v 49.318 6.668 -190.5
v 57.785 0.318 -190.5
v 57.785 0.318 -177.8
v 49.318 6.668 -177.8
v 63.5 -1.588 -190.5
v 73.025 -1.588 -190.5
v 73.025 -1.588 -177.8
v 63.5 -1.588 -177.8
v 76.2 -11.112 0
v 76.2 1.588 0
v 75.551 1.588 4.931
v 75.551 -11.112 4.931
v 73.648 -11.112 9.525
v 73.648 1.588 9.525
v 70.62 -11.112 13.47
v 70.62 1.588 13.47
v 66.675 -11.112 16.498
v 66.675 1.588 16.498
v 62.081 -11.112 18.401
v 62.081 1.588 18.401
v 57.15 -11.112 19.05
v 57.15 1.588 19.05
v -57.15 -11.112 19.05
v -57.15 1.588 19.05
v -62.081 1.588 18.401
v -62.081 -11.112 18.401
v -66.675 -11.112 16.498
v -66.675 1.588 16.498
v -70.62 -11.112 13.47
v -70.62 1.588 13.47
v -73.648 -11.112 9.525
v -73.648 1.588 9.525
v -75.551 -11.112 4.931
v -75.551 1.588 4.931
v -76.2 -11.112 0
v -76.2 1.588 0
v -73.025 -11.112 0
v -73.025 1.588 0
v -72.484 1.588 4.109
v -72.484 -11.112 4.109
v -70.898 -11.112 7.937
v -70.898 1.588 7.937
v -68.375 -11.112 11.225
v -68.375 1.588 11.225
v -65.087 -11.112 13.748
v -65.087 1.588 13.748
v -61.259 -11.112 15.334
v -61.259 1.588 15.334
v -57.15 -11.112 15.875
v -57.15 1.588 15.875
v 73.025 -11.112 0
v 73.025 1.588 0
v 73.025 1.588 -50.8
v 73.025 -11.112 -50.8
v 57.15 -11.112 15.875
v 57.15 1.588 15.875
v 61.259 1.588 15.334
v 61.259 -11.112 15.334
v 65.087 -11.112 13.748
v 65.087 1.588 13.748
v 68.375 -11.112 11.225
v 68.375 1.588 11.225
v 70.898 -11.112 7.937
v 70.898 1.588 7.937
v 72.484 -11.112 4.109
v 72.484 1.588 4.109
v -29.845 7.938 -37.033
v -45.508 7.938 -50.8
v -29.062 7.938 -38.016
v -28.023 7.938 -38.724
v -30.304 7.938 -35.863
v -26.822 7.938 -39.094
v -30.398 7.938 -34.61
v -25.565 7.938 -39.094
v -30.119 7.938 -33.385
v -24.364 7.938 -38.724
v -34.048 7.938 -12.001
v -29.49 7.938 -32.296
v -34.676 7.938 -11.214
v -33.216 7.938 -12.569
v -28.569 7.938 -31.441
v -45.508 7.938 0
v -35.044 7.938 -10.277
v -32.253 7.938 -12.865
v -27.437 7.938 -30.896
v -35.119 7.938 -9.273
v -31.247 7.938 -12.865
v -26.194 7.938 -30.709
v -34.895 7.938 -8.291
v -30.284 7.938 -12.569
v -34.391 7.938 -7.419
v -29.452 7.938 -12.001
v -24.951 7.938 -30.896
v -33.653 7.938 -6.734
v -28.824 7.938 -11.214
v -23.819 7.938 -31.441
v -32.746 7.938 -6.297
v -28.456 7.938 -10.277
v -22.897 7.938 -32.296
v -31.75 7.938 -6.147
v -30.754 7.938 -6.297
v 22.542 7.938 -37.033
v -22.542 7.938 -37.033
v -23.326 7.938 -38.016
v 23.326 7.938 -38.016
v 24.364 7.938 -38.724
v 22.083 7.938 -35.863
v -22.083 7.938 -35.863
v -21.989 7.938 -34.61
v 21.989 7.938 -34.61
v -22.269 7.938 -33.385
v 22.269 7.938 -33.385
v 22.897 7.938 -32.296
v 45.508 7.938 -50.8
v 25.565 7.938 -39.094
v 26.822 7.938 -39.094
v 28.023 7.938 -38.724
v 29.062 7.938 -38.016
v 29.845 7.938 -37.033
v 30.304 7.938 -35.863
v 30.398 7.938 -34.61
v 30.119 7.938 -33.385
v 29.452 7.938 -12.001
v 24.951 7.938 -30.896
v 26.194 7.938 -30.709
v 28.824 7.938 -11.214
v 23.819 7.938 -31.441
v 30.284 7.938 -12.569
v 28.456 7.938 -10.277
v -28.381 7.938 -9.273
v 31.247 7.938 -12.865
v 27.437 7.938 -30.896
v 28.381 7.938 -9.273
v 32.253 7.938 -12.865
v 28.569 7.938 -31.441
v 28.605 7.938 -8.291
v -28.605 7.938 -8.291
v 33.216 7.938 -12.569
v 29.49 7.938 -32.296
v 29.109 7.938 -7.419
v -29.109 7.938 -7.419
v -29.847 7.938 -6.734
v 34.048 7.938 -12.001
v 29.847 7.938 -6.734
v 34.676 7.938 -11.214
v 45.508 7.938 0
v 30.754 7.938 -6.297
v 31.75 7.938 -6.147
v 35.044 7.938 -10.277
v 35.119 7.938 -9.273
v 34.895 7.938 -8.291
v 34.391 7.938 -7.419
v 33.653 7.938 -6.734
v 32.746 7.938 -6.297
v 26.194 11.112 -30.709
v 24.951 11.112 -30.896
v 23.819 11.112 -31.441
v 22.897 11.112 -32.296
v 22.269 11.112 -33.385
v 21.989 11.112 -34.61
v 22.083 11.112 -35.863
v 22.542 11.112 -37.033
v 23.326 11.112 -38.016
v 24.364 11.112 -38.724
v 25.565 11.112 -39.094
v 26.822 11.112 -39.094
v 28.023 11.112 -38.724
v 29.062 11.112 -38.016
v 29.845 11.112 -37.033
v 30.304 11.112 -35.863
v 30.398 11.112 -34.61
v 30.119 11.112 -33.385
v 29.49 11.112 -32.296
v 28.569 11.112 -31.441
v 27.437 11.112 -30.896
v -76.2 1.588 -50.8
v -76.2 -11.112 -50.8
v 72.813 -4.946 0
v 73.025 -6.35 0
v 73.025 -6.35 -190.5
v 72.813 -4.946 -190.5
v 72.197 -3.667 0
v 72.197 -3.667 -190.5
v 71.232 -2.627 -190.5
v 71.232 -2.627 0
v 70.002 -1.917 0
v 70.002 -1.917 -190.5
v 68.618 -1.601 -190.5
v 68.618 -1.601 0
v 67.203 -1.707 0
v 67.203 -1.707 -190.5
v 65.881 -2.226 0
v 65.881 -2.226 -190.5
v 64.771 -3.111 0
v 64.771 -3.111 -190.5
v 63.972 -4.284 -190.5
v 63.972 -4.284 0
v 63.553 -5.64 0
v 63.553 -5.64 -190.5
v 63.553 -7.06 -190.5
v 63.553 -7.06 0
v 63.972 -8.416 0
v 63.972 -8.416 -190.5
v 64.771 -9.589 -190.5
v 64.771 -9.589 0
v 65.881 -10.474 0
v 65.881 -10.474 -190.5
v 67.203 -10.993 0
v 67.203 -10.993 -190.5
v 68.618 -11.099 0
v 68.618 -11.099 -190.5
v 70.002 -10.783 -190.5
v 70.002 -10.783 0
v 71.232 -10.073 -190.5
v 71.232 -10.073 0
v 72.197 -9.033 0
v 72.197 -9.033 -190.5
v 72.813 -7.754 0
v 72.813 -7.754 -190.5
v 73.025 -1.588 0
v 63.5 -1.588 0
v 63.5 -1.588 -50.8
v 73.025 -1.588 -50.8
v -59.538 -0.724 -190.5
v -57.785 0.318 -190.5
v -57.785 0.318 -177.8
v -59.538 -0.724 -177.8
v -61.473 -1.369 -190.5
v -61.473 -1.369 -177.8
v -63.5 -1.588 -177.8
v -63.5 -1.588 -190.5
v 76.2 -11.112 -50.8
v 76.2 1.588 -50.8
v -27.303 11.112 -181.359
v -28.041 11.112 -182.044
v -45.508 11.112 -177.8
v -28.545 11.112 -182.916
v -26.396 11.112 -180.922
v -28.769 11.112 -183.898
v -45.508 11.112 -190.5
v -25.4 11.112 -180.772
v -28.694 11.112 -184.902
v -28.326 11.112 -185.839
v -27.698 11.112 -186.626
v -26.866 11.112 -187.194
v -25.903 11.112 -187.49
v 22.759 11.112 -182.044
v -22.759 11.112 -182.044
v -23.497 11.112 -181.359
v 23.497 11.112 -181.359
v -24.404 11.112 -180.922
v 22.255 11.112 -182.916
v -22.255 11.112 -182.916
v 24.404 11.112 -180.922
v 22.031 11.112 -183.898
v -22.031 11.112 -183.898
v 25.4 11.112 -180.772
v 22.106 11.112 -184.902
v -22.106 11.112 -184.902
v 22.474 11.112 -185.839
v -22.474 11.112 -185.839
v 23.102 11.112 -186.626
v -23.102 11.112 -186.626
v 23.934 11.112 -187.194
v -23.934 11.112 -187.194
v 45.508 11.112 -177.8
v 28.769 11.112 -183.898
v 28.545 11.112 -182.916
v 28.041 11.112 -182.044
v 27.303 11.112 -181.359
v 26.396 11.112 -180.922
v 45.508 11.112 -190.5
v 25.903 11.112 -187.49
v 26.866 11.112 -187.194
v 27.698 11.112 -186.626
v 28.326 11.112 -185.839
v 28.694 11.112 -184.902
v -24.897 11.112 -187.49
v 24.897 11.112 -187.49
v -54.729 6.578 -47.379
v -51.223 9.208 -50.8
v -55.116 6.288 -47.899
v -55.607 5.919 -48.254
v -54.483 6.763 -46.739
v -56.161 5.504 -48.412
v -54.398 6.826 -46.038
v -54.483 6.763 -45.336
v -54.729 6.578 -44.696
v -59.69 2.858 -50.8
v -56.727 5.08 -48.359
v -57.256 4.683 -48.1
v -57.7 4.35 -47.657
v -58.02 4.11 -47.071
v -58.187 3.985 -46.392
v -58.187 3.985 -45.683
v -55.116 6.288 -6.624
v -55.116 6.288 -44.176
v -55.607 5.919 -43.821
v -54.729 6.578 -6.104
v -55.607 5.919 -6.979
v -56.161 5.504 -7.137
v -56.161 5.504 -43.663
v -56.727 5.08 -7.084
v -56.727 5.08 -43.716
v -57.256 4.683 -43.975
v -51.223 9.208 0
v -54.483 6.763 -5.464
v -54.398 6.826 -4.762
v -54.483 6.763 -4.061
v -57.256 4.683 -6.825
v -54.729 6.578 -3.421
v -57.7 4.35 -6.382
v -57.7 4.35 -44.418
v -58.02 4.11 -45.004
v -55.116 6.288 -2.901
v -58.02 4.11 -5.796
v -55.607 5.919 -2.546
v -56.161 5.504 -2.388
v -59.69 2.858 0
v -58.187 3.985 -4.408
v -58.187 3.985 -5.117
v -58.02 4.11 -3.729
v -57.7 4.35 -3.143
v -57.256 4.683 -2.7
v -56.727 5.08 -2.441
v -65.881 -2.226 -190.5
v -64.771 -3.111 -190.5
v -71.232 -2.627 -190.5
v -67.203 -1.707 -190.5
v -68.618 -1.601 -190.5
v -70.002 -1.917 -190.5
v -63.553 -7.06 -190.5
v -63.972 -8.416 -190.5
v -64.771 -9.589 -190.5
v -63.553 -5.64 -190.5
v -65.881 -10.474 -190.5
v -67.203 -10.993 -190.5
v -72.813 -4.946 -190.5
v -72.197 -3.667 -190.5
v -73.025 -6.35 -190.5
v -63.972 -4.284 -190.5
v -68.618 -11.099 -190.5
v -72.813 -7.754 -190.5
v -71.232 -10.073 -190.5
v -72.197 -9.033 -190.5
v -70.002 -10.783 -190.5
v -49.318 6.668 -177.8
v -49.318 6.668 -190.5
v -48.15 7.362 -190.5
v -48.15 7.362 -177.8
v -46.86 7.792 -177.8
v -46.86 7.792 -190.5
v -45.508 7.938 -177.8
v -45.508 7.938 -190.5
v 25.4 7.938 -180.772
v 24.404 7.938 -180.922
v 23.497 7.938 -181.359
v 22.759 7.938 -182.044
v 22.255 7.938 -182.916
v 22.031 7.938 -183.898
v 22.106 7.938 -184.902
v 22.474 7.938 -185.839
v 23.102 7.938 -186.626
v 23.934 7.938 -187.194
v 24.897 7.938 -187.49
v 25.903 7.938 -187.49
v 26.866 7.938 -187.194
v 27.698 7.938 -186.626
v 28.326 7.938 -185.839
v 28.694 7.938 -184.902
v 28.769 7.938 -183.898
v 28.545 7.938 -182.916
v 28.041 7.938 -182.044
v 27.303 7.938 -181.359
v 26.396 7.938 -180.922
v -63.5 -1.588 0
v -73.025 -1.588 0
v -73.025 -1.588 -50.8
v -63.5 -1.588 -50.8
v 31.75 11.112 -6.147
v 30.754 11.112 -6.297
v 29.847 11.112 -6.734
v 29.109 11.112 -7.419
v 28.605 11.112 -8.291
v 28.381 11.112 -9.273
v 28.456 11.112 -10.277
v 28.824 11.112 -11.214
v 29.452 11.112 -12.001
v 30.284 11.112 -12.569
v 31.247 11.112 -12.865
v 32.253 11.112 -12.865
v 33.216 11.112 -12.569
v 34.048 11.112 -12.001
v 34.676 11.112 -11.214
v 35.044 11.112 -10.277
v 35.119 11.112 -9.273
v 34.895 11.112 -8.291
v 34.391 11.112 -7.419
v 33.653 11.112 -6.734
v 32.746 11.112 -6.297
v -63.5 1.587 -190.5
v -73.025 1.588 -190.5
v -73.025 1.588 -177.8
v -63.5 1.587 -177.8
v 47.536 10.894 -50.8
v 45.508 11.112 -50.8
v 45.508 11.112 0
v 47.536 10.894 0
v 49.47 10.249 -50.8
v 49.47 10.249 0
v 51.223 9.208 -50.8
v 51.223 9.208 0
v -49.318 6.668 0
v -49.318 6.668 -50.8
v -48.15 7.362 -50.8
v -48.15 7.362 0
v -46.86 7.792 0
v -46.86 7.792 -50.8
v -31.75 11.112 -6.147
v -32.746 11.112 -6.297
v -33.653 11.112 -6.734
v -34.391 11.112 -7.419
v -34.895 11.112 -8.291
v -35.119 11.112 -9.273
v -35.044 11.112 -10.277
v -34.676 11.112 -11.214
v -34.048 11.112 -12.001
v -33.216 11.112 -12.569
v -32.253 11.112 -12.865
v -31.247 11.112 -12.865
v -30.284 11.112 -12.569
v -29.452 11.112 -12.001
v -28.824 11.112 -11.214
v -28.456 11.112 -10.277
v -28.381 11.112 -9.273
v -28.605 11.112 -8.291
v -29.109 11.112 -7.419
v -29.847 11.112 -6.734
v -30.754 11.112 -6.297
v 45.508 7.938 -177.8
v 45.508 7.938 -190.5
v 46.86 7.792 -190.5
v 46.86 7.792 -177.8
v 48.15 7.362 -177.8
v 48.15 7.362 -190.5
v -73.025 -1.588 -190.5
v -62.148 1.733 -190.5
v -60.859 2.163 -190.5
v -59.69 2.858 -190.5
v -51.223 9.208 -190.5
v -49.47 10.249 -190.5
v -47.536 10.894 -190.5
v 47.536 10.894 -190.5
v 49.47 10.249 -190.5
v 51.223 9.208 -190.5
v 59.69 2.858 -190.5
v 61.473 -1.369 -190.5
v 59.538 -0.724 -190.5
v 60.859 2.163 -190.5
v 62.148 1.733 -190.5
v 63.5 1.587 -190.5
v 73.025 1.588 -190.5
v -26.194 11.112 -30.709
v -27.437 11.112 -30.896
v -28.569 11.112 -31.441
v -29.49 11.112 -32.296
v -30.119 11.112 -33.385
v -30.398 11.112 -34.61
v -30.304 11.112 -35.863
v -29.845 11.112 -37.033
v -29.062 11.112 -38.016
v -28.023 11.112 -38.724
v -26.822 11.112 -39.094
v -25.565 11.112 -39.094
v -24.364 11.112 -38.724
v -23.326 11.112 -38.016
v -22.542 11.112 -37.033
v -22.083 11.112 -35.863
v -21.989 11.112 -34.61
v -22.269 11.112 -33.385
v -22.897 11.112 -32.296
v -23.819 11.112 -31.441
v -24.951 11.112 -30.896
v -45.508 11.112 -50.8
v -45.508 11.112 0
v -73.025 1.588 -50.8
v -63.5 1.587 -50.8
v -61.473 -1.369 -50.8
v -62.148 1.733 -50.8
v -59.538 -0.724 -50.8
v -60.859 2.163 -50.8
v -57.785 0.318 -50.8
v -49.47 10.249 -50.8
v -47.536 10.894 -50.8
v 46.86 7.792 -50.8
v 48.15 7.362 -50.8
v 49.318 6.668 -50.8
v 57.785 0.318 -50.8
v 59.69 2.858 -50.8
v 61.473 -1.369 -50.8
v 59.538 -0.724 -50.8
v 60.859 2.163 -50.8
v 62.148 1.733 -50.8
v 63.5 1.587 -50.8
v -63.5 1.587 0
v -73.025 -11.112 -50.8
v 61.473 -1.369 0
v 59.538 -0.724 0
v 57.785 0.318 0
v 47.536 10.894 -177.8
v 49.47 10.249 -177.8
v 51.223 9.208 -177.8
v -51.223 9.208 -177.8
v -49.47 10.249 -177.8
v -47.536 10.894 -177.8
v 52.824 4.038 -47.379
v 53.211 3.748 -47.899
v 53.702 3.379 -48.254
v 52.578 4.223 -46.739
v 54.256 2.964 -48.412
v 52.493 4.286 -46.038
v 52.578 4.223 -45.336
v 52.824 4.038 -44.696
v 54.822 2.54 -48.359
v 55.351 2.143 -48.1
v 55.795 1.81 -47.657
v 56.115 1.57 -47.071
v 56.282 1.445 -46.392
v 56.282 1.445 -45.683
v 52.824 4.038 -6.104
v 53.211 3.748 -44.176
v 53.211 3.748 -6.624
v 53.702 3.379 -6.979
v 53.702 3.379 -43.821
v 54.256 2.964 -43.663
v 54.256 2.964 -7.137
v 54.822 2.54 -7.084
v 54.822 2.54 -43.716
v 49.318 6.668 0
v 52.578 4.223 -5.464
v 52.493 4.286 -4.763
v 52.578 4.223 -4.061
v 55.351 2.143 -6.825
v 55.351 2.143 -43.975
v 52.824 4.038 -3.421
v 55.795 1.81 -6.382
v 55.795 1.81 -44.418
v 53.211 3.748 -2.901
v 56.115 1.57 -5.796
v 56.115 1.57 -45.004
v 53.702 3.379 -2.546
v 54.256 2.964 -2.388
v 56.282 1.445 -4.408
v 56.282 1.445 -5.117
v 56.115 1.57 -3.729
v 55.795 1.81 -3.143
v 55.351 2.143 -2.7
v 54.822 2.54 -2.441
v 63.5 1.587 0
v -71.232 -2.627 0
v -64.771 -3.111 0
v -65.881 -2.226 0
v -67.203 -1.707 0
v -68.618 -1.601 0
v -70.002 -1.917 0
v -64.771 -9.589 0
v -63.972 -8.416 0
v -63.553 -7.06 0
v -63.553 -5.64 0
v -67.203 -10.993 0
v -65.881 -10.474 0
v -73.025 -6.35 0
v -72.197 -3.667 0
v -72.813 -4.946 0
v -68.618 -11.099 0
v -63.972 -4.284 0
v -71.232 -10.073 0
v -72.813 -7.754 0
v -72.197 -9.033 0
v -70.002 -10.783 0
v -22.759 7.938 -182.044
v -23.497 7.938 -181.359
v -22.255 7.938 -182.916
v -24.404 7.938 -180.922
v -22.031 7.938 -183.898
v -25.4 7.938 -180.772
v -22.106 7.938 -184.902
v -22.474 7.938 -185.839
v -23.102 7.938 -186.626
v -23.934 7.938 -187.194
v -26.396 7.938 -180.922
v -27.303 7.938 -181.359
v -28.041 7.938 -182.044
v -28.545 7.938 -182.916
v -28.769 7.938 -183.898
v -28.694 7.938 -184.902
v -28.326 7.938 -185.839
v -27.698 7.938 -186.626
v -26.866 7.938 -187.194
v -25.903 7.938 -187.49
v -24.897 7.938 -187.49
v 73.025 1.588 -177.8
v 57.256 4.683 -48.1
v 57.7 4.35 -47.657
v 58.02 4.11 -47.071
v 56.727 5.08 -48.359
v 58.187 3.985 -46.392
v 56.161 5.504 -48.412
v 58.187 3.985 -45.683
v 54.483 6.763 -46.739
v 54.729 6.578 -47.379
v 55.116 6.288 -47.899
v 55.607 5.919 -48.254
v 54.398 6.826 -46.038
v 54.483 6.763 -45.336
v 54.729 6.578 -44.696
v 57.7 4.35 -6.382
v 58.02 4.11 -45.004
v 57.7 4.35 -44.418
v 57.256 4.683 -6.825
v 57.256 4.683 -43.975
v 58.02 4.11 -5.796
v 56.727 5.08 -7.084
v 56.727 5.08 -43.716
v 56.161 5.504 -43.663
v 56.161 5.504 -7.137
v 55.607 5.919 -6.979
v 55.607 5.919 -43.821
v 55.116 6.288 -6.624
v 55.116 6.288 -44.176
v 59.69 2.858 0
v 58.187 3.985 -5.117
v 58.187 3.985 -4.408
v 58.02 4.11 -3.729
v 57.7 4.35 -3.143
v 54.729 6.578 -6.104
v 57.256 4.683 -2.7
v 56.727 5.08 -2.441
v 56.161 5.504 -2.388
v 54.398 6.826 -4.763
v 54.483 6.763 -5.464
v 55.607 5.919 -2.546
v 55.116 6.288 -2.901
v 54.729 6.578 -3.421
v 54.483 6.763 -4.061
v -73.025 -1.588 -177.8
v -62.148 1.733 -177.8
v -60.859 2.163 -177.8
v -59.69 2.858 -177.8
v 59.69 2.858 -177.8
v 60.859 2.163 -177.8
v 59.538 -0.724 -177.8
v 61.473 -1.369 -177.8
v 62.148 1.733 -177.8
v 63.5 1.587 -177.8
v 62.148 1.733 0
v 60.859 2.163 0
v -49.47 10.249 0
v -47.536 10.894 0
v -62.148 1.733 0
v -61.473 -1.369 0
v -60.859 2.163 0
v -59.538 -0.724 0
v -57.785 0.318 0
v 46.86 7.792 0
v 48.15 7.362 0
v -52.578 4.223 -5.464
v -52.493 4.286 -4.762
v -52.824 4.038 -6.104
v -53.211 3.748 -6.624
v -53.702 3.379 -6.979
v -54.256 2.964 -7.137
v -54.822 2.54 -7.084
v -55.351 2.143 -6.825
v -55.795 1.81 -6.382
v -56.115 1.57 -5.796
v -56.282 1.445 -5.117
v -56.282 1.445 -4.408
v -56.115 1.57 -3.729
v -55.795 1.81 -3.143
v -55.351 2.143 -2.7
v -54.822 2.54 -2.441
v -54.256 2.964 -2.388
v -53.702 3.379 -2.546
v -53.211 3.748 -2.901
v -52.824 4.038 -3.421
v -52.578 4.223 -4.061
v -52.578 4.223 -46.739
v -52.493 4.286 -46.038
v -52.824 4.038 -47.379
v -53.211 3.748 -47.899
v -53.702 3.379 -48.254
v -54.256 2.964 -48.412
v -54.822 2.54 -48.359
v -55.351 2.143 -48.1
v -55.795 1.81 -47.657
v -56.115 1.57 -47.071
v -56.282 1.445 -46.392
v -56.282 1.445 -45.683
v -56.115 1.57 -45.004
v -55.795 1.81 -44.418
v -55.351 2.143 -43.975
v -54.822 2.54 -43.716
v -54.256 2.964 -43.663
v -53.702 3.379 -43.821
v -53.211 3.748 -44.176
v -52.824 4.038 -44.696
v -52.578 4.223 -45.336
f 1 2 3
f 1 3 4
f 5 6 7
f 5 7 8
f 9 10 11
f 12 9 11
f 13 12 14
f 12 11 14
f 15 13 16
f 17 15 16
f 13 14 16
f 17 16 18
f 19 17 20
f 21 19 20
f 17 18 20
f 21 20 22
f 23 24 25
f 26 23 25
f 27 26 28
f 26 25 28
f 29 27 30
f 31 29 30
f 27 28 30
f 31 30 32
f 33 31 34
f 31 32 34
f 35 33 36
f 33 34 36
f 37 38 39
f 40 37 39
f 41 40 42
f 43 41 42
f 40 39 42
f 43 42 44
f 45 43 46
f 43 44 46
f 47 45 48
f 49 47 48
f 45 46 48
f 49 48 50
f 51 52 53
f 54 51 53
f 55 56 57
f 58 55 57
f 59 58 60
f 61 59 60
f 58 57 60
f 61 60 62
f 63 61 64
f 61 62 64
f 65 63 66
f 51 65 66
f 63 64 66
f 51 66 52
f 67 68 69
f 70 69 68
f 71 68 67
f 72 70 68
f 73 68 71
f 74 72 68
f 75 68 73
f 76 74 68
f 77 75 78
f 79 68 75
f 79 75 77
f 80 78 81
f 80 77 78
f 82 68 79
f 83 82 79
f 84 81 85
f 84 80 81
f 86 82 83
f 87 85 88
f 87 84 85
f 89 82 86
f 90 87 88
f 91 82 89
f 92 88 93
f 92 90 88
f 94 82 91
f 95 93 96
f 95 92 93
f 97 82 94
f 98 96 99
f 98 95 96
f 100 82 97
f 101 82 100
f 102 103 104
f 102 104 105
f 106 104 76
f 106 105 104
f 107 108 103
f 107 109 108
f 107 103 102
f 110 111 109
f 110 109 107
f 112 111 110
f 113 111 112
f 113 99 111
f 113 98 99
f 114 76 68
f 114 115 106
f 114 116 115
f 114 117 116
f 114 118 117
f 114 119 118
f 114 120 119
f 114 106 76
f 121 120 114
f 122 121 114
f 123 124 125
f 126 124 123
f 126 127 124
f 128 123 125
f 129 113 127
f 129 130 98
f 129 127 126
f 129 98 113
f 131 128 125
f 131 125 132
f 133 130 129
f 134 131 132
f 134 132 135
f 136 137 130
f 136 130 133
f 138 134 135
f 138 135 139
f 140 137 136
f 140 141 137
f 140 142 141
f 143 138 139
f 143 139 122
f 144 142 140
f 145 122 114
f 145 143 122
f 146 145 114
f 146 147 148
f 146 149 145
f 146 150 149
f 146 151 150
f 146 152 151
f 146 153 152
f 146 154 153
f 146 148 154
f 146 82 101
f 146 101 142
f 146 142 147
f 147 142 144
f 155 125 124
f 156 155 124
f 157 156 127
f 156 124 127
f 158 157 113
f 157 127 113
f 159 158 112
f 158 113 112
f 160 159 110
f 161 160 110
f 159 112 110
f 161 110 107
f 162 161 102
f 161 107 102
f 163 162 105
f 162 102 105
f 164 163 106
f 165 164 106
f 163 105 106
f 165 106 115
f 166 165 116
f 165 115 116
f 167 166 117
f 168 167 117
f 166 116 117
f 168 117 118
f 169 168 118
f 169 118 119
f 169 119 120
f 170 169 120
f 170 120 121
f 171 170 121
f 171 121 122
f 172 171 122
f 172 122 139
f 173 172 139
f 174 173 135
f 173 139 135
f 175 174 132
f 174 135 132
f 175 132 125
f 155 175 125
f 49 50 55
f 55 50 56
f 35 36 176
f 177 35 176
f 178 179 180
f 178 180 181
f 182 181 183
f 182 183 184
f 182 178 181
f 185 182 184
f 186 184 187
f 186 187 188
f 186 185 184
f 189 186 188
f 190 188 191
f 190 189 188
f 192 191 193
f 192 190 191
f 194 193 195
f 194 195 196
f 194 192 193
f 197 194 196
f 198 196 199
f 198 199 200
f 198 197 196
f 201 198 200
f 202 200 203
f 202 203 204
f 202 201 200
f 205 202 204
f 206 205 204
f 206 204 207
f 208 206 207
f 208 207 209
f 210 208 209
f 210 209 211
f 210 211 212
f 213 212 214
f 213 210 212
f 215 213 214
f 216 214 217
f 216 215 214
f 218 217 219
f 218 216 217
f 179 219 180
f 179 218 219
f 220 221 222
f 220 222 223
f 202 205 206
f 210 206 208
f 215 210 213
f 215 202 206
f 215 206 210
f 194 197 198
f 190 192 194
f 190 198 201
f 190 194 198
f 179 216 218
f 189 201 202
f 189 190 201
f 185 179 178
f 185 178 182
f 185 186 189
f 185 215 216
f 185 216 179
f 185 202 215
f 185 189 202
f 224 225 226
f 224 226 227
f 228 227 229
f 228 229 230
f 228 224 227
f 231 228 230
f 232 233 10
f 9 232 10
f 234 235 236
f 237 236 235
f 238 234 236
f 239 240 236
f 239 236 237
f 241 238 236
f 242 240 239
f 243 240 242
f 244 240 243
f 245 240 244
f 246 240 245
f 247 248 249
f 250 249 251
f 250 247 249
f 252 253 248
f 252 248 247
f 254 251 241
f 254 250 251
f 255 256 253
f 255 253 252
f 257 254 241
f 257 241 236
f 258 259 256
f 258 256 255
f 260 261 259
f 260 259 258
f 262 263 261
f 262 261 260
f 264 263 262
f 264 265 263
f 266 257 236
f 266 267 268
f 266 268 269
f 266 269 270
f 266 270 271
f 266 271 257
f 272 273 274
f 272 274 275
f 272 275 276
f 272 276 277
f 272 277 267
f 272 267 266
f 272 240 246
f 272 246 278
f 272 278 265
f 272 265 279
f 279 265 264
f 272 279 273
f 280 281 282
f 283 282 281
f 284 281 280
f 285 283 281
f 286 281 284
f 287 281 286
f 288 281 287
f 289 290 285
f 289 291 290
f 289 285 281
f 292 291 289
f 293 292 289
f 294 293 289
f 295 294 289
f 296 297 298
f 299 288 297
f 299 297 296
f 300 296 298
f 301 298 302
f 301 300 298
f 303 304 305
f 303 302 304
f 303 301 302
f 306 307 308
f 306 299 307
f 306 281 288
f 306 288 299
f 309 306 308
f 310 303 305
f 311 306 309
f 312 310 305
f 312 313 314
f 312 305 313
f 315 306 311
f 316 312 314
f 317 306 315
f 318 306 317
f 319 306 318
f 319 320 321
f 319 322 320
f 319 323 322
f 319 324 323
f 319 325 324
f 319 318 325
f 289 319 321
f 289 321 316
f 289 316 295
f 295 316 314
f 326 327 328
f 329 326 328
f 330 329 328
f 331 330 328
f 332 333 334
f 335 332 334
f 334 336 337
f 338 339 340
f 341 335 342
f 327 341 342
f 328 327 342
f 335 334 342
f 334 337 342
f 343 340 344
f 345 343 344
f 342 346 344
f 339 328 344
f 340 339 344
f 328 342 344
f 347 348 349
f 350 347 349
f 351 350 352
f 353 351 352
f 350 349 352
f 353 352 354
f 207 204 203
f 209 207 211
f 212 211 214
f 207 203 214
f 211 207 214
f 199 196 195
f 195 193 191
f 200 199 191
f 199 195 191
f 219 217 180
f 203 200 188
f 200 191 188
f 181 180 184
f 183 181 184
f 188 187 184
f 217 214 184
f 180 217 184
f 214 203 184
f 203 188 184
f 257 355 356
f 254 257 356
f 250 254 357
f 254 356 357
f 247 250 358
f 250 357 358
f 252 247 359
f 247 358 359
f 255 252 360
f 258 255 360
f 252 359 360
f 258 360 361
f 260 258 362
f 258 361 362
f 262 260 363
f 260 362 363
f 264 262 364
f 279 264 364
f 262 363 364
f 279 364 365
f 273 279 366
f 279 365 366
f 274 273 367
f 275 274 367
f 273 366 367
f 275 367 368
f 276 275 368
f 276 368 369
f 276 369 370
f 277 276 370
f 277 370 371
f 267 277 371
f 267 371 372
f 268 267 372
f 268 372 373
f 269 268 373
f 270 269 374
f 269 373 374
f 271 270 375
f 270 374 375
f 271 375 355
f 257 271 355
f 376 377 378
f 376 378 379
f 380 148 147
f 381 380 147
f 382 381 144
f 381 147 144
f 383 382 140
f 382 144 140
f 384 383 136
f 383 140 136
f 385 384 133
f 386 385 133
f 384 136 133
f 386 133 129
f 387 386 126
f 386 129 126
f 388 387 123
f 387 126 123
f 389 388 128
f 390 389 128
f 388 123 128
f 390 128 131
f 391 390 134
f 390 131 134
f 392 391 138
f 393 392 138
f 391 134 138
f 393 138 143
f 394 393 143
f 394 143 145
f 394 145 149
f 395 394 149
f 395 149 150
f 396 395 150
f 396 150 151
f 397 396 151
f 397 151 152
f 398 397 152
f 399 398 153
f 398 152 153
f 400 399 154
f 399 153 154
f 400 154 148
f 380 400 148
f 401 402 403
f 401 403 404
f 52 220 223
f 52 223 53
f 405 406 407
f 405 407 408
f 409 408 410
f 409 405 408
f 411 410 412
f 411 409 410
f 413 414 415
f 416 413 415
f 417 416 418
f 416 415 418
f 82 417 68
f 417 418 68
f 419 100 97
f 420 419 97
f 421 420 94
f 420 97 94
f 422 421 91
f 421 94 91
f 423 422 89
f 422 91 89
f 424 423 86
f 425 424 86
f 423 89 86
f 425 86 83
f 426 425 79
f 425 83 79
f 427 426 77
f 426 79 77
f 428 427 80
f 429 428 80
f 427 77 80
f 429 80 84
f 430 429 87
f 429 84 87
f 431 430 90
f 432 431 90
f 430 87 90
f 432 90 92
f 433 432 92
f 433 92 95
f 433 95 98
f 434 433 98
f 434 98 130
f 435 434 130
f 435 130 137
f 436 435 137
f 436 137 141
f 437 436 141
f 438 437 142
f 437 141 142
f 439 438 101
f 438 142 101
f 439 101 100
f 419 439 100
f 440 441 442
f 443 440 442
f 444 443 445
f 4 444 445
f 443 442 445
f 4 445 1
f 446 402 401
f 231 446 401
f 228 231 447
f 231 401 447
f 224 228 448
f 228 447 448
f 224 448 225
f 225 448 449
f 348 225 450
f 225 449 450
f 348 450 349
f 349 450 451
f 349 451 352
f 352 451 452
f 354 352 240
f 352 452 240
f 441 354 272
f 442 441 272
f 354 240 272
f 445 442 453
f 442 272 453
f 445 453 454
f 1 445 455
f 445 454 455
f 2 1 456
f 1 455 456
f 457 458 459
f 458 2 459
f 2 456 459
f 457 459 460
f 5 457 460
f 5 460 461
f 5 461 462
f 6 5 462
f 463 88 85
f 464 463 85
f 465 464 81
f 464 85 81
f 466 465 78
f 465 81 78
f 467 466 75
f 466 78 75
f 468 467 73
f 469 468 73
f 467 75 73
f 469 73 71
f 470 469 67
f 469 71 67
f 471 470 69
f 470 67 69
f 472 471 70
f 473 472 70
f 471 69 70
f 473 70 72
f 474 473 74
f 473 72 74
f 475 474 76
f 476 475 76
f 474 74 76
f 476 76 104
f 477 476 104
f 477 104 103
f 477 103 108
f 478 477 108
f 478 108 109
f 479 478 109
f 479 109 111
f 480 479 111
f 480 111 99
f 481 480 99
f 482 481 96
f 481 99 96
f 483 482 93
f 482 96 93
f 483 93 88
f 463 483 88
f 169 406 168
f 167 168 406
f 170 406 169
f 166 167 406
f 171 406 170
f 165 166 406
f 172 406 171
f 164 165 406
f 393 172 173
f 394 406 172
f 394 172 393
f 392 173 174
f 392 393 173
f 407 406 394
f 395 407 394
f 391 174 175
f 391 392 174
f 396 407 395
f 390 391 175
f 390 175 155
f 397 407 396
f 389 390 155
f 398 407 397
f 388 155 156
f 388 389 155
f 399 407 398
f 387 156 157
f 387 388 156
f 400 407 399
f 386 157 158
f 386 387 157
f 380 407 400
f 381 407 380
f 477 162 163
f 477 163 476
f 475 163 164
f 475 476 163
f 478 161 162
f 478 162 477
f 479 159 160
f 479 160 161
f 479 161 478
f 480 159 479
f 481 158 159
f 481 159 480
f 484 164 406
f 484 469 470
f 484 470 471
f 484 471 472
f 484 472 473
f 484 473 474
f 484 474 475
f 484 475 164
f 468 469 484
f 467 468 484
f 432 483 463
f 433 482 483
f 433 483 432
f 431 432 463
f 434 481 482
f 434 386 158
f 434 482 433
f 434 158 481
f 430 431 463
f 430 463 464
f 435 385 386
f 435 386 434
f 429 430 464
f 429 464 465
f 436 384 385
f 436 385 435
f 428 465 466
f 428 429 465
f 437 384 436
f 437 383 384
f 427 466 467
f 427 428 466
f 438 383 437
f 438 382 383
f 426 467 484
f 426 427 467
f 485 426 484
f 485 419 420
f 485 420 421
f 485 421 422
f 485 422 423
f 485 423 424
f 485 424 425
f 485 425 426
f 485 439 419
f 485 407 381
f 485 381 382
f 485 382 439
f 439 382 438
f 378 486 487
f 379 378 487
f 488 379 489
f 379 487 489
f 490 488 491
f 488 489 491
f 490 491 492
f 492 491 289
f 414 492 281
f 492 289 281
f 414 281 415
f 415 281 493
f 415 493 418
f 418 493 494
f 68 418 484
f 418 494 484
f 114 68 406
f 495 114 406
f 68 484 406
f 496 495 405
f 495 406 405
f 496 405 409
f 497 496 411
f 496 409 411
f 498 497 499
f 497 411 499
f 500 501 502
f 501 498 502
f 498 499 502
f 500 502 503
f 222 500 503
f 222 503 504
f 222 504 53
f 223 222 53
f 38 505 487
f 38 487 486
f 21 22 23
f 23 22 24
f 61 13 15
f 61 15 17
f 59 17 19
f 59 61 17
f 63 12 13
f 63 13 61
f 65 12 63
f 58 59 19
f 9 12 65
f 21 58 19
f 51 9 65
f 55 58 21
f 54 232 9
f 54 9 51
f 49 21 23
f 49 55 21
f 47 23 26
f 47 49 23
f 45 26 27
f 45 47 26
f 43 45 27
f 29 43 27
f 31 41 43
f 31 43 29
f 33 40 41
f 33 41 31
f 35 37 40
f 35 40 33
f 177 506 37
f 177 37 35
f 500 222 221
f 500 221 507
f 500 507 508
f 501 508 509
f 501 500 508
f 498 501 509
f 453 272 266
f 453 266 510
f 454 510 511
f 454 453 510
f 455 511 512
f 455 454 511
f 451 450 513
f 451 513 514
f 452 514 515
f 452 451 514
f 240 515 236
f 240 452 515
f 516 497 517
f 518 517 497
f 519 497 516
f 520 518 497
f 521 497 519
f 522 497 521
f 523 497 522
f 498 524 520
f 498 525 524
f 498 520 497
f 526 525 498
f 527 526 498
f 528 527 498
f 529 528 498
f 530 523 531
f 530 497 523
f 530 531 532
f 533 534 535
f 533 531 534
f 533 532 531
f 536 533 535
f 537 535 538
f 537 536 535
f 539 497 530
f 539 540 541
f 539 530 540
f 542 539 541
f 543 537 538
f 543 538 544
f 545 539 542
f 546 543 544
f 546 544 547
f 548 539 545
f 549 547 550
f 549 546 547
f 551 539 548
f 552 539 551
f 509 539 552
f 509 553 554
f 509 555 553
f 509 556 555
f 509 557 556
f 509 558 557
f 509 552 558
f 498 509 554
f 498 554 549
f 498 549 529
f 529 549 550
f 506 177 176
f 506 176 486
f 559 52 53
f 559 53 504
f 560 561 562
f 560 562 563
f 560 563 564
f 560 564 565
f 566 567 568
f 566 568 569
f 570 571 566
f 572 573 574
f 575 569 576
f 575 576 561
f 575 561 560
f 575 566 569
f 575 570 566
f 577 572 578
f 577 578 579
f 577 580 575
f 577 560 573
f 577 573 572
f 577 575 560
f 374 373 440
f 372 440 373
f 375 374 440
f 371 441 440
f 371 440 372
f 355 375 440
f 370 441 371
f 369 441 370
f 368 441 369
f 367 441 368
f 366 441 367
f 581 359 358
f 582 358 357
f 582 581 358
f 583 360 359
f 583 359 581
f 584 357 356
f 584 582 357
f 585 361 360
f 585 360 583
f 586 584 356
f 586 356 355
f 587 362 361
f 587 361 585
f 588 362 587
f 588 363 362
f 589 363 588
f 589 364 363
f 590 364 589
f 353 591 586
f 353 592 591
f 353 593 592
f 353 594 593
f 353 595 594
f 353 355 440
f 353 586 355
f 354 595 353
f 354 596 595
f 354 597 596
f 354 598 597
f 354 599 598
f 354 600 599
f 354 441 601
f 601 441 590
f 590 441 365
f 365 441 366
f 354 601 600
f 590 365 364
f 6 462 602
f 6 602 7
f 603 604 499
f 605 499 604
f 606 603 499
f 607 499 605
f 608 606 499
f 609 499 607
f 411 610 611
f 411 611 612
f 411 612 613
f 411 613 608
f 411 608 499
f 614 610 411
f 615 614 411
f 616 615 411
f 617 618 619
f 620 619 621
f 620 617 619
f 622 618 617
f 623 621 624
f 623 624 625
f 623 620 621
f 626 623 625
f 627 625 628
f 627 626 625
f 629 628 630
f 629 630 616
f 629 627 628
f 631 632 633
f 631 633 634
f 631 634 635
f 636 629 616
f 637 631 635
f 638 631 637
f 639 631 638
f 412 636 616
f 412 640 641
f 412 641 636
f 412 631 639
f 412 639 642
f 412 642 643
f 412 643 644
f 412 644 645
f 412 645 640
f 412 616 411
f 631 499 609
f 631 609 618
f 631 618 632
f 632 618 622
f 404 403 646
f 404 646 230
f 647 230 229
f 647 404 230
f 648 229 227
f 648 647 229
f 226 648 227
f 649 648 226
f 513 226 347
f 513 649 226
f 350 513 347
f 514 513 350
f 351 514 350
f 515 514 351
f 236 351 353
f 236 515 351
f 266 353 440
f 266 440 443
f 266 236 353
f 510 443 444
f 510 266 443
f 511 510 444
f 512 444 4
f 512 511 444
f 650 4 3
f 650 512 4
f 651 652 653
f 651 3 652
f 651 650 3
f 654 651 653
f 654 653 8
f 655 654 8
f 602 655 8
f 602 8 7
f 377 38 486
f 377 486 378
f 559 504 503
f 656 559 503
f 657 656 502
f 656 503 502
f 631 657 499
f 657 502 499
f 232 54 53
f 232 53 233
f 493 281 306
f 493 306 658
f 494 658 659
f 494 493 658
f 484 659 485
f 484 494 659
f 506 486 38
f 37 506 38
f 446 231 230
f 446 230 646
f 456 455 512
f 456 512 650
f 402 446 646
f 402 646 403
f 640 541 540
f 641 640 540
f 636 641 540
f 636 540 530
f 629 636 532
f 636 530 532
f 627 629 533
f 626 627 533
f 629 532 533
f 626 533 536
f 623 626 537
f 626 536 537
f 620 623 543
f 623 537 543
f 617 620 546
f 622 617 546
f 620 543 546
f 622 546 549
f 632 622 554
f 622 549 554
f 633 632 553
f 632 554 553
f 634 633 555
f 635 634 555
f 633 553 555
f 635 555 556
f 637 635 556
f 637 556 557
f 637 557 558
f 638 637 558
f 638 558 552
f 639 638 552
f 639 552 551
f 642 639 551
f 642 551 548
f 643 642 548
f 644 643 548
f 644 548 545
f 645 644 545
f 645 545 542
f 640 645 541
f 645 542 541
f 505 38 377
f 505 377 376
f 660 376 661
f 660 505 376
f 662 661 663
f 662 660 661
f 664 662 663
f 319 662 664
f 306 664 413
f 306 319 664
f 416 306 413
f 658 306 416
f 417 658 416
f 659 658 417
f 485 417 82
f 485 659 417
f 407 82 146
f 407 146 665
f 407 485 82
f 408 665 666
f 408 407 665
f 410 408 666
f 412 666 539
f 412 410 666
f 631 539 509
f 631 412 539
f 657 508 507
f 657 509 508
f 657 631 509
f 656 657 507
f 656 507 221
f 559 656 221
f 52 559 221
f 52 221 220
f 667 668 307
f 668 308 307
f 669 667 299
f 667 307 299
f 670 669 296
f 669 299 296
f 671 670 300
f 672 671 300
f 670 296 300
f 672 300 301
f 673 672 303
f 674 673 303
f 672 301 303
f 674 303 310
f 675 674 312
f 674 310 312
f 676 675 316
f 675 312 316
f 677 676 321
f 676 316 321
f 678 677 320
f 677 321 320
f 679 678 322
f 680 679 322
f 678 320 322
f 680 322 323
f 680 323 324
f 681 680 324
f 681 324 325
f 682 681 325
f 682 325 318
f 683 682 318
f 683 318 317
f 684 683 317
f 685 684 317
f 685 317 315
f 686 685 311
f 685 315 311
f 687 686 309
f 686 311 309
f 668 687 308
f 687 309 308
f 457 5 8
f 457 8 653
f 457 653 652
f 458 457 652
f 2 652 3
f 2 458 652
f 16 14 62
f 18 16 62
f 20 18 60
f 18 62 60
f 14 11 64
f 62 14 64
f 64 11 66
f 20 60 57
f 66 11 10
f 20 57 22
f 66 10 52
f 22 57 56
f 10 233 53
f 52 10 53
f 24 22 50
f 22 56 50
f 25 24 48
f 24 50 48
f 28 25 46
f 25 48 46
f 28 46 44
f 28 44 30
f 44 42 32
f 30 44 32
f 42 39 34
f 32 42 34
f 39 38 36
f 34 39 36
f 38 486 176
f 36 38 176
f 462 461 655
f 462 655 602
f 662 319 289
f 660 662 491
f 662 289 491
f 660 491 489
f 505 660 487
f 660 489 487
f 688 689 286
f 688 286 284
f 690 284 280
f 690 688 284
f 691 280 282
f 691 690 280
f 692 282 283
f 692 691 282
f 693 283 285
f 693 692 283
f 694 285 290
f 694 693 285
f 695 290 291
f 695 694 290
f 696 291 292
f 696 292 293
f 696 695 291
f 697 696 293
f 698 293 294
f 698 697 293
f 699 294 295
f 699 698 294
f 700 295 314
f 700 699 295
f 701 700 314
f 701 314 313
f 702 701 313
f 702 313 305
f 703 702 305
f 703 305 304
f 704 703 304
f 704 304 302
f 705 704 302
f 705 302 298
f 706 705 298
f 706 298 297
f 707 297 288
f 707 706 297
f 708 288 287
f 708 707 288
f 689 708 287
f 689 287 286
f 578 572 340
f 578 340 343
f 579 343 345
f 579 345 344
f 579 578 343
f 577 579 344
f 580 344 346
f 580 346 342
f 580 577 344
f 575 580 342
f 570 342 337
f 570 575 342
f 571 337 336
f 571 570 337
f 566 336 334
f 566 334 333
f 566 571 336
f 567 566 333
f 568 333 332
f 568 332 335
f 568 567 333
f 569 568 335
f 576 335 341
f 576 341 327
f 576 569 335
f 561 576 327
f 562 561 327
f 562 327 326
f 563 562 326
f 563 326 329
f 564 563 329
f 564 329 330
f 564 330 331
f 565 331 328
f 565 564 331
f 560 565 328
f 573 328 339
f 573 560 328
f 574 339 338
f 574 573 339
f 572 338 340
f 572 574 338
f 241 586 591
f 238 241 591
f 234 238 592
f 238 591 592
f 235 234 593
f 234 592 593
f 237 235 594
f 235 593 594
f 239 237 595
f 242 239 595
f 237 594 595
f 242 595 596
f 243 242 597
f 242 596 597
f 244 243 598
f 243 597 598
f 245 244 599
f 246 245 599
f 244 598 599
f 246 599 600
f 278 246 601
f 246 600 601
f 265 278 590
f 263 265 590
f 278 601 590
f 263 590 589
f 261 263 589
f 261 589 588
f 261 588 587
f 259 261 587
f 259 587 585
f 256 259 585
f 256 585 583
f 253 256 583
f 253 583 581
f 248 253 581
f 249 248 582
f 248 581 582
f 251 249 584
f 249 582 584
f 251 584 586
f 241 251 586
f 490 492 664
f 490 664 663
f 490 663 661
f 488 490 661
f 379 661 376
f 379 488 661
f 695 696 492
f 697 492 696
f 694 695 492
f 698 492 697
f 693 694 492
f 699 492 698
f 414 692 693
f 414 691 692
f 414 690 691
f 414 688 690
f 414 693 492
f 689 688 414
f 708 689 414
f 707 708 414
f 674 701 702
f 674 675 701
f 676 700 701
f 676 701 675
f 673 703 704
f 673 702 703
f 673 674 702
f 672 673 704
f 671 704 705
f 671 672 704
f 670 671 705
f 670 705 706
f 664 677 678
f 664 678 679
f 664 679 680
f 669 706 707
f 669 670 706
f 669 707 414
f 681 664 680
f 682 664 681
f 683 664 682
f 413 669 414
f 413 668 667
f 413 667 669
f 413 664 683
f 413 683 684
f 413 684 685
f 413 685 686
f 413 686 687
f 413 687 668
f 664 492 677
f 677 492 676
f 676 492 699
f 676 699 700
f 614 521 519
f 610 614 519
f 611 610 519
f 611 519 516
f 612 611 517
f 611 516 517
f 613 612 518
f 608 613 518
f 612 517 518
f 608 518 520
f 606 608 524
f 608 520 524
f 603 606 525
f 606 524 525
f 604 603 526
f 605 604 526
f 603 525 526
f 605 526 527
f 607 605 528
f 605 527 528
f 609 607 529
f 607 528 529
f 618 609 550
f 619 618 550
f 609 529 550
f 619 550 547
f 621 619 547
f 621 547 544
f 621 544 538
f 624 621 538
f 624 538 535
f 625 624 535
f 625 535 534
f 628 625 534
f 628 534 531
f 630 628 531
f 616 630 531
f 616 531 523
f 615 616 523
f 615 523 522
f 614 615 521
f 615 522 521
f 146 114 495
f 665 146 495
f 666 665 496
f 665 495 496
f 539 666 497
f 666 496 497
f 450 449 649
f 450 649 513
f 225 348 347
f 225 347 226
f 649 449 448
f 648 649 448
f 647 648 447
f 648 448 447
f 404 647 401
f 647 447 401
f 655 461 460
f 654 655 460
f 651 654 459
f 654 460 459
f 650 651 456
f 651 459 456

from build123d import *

# Parameters (mm, degrees)
BOSS_EXTRUDE1_DEPTH                     = 50.8
BOSS_EXTRUDE3_DEPTH                     = 12.7
SKETCH475_R                             = 4.7625
BOSS_EXTRUDE4_DEPTH                     = 190.5
BOSS_EXTRUDE4_2_DEPTH                   = 190.5
BOSS_EXTRUDE5_DEPTH                     = 12.7
SKETCH480_W                             = 4.2164
SKETCH480_H                             = 22.225
F_5_16_CLEARANCE_HOLE1_AT_2_COUNT       = 2
F_5_16_CLEARANCE_HOLE1_AT_2_PITCH       = 52.3875
SKETCH482_W                             = 3.3782
SKETCH482_H                             = 22.225
F_1_4_CLEARANCE_HOLE1_AT_2_COUNT        = 2
F_1_4_CLEARANCE_HOLE1_AT_2_PITCH        = 63.5
F_1_4_CLEARANCE_HOLE1_AT_3_COUNT        = 2
F_1_4_CLEARANCE_HOLE1_AT_3_PITCH        = 174.740416404
F_1_4_CLEARANCE_HOLE1_AT_4_COUNT        = 2
F_1_4_CLEARANCE_HOLE1_AT_4_PITCH        = 183.738980962
SKETCH484_W                             = 2.38125
SKETCH484_H                             = 83.185
F_3_16_0_1875_DIAMETER_HOLE1_AT_2_COUNT = 2
F_3_16_0_1875_DIAMETER_HOLE1_AT_2_PITCH = 41.275
MIRROR1_COPY_1_SKETCH_W                 = 2.38125
MIRROR1_COPY_1_SKETCH_H                 = 83.185
CONVERT_SOLID1_START                    = -50.8
CONVERT_SOLID1_DEPTH                    = 50.8
CONVERT_SOLID1_2_DEPTH                  = 50.8
CONVERT_SOLID2_START                    = -190.5
CONVERT_SOLID2_DEPTH                    = 12.7
CONVERT_SOLID2_2_DEPTH                  = 12.7


# Read off the part's stored shape, not the designer's step: Convert-Solid1, Convert-Solid2
with BuildPart() as part:
    # Sketch1 → Boss-Extrude1 (new body)
    with BuildSketch(Plane.XY):
        Polygon((0, 7.9375), (47.625, 7.9375), (60.325, -1.5875), (73.025, -1.5875), (73.025, 1.5875), (61.383333333, 1.5875), (48.683333333, 11.1125), (0, 11.1125), (-48.683333333, 11.1125), (-61.383333333, 1.5875), (-73.025, 1.5875), (-73.025, -1.5875), (-60.325, -1.5875), (-47.625, 7.9375), align=None)
    extrude(amount=-BOSS_EXTRUDE1_DEPTH)

    # Sketch480 → 5/16 Clearance Hole1 (revolve, cut)
    with BuildSketch(Plane(origin=(-26.19375, 11.1125, -34.925), x_dir=(0, 0, 1), z_dir=(1, 0, 0))):
        with Locations((2.1082, 11.1125)):
            Rectangle(SKETCH480_W, SKETCH480_H)
    f_5_16_clearance_hole1 = revolve(axis=Axis((-26.19375, 17.4625, -34.925), (0, -1, 0)), mode=Mode.SUBTRACT)

    # 5/16 Clearance Hole1 at 2: 5/16 Clearance Hole1 ×2
    with Locations(*[(i * F_5_16_CLEARANCE_HOLE1_AT_2_PITCH, 0, 0) for i in range(1, F_5_16_CLEARANCE_HOLE1_AT_2_COUNT)]):
        add(f_5_16_clearance_hole1, mode=Mode.SUBTRACT)

    # Sketch482 → 1/4 Clearance Hole1 (revolve, cut)
    with BuildSketch(Plane(origin=(-31.75, 11.1125, -9.525), x_dir=(0, 0, 1), z_dir=(1, 0, 0))):
        with Locations((1.6891, 11.1125)):
            Rectangle(SKETCH482_W, SKETCH482_H)
    f_1_4_clearance_hole1 = revolve(axis=Axis((-31.75, 17.4625, -9.525), (0, -1, 0)), mode=Mode.SUBTRACT)

    # 1/4 Clearance Hole1 at 2: 1/4 Clearance Hole1 ×2
    with Locations(*[(i * F_1_4_CLEARANCE_HOLE1_AT_2_PITCH, 0, 0) for i in range(1, F_1_4_CLEARANCE_HOLE1_AT_2_COUNT)]):
        add(f_1_4_clearance_hole1, mode=Mode.SUBTRACT)

    # Sketch484 → 3/16 (0.1875) Diameter Hole1 (revolve, cut)
    with BuildSketch(Plane(origin=(56.303333333, 5.3975, -46.0375), x_dir=(-0.7999999999999998, 0.6000000000000002, 0), z_dir=(0, 0, 1))):
        with Locations((1.190625, 41.5925)):
            Rectangle(SKETCH484_W, SKETCH484_H)
    f_3_16_0_1875_diameter_hole1 = revolve(axis=Axis((60.113333333, 10.4775, -46.0375), (-0.6000000000000003, -0.7999999999999998, 0)), mode=Mode.SUBTRACT)

    # 3/16 (0.1875) Diameter Hole1 at 2: 3/16 (0.1875) Diameter Hole1 ×2
    with Locations(*[(0, 0, i * F_3_16_0_1875_DIAMETER_HOLE1_AT_2_PITCH) for i in range(1, F_3_16_0_1875_DIAMETER_HOLE1_AT_2_COUNT)]):
        add(f_3_16_0_1875_diameter_hole1, mode=Mode.SUBTRACT)

    # Mirror1: 3/16 (0.1875) Diameter Hole1 across plane
    add(f_3_16_0_1875_diameter_hole1.mirror(Plane(origin=(0, 0, 0), x_dir=(0, 0, 1), z_dir=(1, 0, 0))), mode=Mode.SUBTRACT)

    # Mirror1 copy 1 sketch → Mirror1 copy 1 (revolve, cut)
    with BuildSketch(Plane(origin=(-56.303333333, 5.3975, -4.7625), x_dir=(0.7999999999999998, 0.6000000000000002, 0), z_dir=(0, 0, 1))):
        with Locations((1.190625, -41.5925)):
            Rectangle(MIRROR1_COPY_1_SKETCH_W, MIRROR1_COPY_1_SKETCH_H)
    revolve(axis=Axis((-60.113333333, 10.4775, -4.7625), (-0.6000000000000003, 0.7999999999999998, 0)), mode=Mode.SUBTRACT)

    # Convert-Solid1 outline → Convert-Solid1 (cut)
    with BuildSketch(Plane.XY.offset(CONVERT_SOLID1_START)):
        with BuildLine():
            ThreePointArc((63.5, -1.5875), (60.487930529, -1.098708414), (57.785, 0.3175))
            Line((57.785, 0.3175), (60.325, -1.5875))
            Line((60.325, -1.5875), (63.5, -1.5875))
        make_face()
        with BuildLine():
            Line((-60.325, -1.5875), (-57.785, 0.3175))
            ThreePointArc((-57.785, 0.3175), (-60.487930529, -1.098708414), (-63.5, -1.5875))
            Line((-63.5, -1.5875), (-60.325, -1.5875))
        make_face()
        with BuildLine():
            ThreePointArc((45.508333333, 11.1125), (48.520402804, 10.623708414), (51.223333333, 9.2075))
            Line((51.223333333, 9.2075), (48.683333333, 11.1125))
            Line((48.683333333, 11.1125), (45.508333333, 11.1125))
        make_face()
        with BuildLine():
            ThreePointArc((-51.223333333, 9.2075), (-48.520402804, 10.623708414), (-45.508333333, 11.1125))
            Line((-45.508333333, 11.1125), (-48.683333333, 11.1125))
            Line((-48.683333333, 11.1125), (-51.223333333, 9.2075))
        make_face()
    extrude(amount=CONVERT_SOLID1_DEPTH, mode=Mode.SUBTRACT)

    # Convert-Solid1 2 outline → Convert-Solid1 2 (add)
    with BuildSketch(Plane.XY.offset(CONVERT_SOLID1_START)):
        with BuildLine():
            Line((61.383333333, 1.5875), (63.5, 1.5875))
            ThreePointArc((63.5, 1.5875), (61.491953686, 1.913361057), (59.69, 2.8575))
            Line((59.69, 2.8575), (61.383333333, 1.5875))
        make_face()
        with BuildLine():
            ThreePointArc((45.508333333, 7.9375), (47.516379647, 7.611638943), (49.318333333, 6.6675))
            Line((49.318333333, 6.6675), (47.625, 7.9375))
            Line((47.625, 7.9375), (45.508333333, 7.9375))
        make_face()
        with BuildLine():
            Line((-47.625, 7.9375), (-49.318333333, 6.6675))
            ThreePointArc((-49.318333333, 6.6675), (-47.516379647, 7.611638943), (-45.508333333, 7.9375))
            Line((-45.508333333, 7.9375), (-47.625, 7.9375))
        make_face()
        with BuildLine():
            Line((-63.5, 1.5875), (-61.383333333, 1.5875))
            Line((-61.383333333, 1.5875), (-59.69, 2.8575))
            ThreePointArc((-59.69, 2.8575), (-61.491953686, 1.913361057), (-63.5, 1.5875))
        make_face()
    extrude(amount=CONVERT_SOLID1_2_DEPTH)


with BuildPart() as body_2:
    # Sketch474 → Boss-Extrude3 (new body)
    with BuildSketch(Plane(origin=(0, 1.5875, 0), x_dir=(1, 0, 0), z_dir=(0, 1, 0))):
        with BuildLine():
            Line((-73.025, 50.8), (-73.025, 0))
            ThreePointArc((-73.025, 0), (-68.375320151, -11.225320151), (-57.15, -15.875))
            Line((-57.15, -15.875), (57.15, -15.875))
            ThreePointArc((57.15, -15.875), (68.375320151, -11.225320151), (73.025, 0))
            Line((73.025, 0), (73.025, 50.8))
            Line((73.025, 50.8), (76.2, 50.8))
            Line((76.2, 50.8), (76.2, 0))
            ThreePointArc((76.2, 0), (70.620384182, -13.470384182), (57.15, -19.05))
            Line((57.15, -19.05), (-57.15, -19.05))
            ThreePointArc((-57.15, -19.05), (-70.620384182, -13.470384182), (-76.2, 0))
            Line((-76.2, 0), (-76.2, 50.8))
            Line((-76.2, 50.8), (-73.025, 50.8))
        make_face()
    extrude(amount=-BOSS_EXTRUDE3_DEPTH)


with BuildPart() as body_3:
    # Sketch475 → Boss-Extrude4 (new body)
    with BuildSketch(Plane.XY):
        with Locations((68.2625, -6.35)):
            Circle(SKETCH475_R)
    extrude(amount=-BOSS_EXTRUDE4_DEPTH)


with BuildPart() as body_4:
    # Sketch475 → Boss-Extrude4 2 (new body)
    with BuildSketch(Plane.XY):
        with Locations(Location((-68.2625, -6.35, 0), (0, 0, 180))):
            Circle(SKETCH475_R)
    extrude(amount=-BOSS_EXTRUDE4_2_DEPTH)


with BuildPart() as body_5:
    # Sketch477 → Boss-Extrude5 (new body)
    with BuildSketch(Plane(origin=(0, 0, -190.5), x_dir=(-1, 0, 0), z_dir=(0, 0, -1))):
        Polygon((-60.325, -1.5875), (-47.625, 7.9375), (47.625, 7.9375), (60.325, -1.5875), (73.025, -1.5875), (73.025, 1.5875), (61.383333333, 1.5875), (48.683333333, 11.1125), (-48.683333333, 11.1125), (-61.383333333, 1.5875), (-73.025, 1.5875), (-73.025, -1.5875), align=None)
    extrude(amount=-BOSS_EXTRUDE5_DEPTH)

    # 1/4 Clearance Hole1 at 3: 1/4 Clearance Hole1 ×2
    with Locations(*[Vector(0.03633961810714297, 0, -0.9993394979464322) * (i * F_1_4_CLEARANCE_HOLE1_AT_3_PITCH) for i in range(1, F_1_4_CLEARANCE_HOLE1_AT_3_COUNT)]):
        add(f_1_4_clearance_hole1, mode=Mode.SUBTRACT)

    # 1/4 Clearance Hole1 at 4: 1/4 Clearance Hole1 ×2
    with Locations(*[Vector(0.3110390604146254, 0, -0.9503971290446889) * (i * F_1_4_CLEARANCE_HOLE1_AT_4_PITCH) for i in range(1, F_1_4_CLEARANCE_HOLE1_AT_4_COUNT)]):
        add(f_1_4_clearance_hole1, mode=Mode.SUBTRACT)

    # Convert-Solid2 outline → Convert-Solid2 (cut)
    with BuildSketch(Plane.XY.offset(CONVERT_SOLID2_START)):
        with BuildLine():
            Line((48.683333333, 11.1125), (45.508333333, 11.1125))
            ThreePointArc((45.508333333, 11.1125), (48.520402804, 10.623708414), (51.223333333, 9.2075))
            Line((51.223333333, 9.2075), (48.683333333, 11.1125))
        make_face()
        with BuildLine():
            Line((-48.683333333, 11.1125), (-51.223333333, 9.2075))
            ThreePointArc((-51.223333333, 9.2075), (-48.520402804, 10.623708414), (-45.508333333, 11.1125))
            Line((-45.508333333, 11.1125), (-48.683333333, 11.1125))
        make_face()
        with BuildLine():
            ThreePointArc((63.5, -1.5875), (60.487930529, -1.098708414), (57.785, 0.3175))
            Line((57.785, 0.3175), (60.325, -1.5875))
            Line((60.325, -1.5875), (63.5, -1.5875))
        make_face()
        with BuildLine():
            ThreePointArc((-57.785, 0.3175), (-60.487930529, -1.098708414), (-63.5, -1.5875))
            Line((-63.5, -1.5875), (-60.325, -1.5875))
            Line((-60.325, -1.5875), (-57.785, 0.3175))
        make_face()
    extrude(amount=CONVERT_SOLID2_DEPTH, mode=Mode.SUBTRACT)

    # Convert-Solid2 2 outline → Convert-Solid2 2 (add)
    with BuildSketch(Plane.XY.offset(CONVERT_SOLID2_START)):
        with BuildLine():
            ThreePointArc((63.5, 1.5875), (61.491953686, 1.913361057), (59.69, 2.8575))
            Line((59.69, 2.8575), (61.383333333, 1.5875))
            Line((61.383333333, 1.5875), (63.5, 1.5875))
        make_face()
        with BuildLine():
            ThreePointArc((-59.69, 2.8575), (-61.491953686, 1.913361057), (-63.5, 1.5875))
            Line((-63.5, 1.5875), (-61.383333333, 1.5875))
            Line((-61.383333333, 1.5875), (-59.69, 2.8575))
        make_face()
        with BuildLine():
            Line((47.625, 7.9375), (45.508333333, 7.9375))
            ThreePointArc((45.508333333, 7.9375), (47.516379647, 7.611638943), (49.318333333, 6.6675))
            Line((49.318333333, 6.6675), (47.625, 7.9375))
        make_face()
        with BuildLine():
            Line((-47.625, 7.9375), (-49.318333333, 6.6675))
            ThreePointArc((-49.318333333, 6.6675), (-47.516379647, 7.611638943), (-45.508333333, 7.9375))
            Line((-45.508333333, 7.9375), (-47.625, 7.9375))
        make_face()
    extrude(amount=CONVERT_SOLID2_2_DEPTH)


solid = Compound([part.part, body_2.part, body_3.part, body_4.part, body_5.part])
